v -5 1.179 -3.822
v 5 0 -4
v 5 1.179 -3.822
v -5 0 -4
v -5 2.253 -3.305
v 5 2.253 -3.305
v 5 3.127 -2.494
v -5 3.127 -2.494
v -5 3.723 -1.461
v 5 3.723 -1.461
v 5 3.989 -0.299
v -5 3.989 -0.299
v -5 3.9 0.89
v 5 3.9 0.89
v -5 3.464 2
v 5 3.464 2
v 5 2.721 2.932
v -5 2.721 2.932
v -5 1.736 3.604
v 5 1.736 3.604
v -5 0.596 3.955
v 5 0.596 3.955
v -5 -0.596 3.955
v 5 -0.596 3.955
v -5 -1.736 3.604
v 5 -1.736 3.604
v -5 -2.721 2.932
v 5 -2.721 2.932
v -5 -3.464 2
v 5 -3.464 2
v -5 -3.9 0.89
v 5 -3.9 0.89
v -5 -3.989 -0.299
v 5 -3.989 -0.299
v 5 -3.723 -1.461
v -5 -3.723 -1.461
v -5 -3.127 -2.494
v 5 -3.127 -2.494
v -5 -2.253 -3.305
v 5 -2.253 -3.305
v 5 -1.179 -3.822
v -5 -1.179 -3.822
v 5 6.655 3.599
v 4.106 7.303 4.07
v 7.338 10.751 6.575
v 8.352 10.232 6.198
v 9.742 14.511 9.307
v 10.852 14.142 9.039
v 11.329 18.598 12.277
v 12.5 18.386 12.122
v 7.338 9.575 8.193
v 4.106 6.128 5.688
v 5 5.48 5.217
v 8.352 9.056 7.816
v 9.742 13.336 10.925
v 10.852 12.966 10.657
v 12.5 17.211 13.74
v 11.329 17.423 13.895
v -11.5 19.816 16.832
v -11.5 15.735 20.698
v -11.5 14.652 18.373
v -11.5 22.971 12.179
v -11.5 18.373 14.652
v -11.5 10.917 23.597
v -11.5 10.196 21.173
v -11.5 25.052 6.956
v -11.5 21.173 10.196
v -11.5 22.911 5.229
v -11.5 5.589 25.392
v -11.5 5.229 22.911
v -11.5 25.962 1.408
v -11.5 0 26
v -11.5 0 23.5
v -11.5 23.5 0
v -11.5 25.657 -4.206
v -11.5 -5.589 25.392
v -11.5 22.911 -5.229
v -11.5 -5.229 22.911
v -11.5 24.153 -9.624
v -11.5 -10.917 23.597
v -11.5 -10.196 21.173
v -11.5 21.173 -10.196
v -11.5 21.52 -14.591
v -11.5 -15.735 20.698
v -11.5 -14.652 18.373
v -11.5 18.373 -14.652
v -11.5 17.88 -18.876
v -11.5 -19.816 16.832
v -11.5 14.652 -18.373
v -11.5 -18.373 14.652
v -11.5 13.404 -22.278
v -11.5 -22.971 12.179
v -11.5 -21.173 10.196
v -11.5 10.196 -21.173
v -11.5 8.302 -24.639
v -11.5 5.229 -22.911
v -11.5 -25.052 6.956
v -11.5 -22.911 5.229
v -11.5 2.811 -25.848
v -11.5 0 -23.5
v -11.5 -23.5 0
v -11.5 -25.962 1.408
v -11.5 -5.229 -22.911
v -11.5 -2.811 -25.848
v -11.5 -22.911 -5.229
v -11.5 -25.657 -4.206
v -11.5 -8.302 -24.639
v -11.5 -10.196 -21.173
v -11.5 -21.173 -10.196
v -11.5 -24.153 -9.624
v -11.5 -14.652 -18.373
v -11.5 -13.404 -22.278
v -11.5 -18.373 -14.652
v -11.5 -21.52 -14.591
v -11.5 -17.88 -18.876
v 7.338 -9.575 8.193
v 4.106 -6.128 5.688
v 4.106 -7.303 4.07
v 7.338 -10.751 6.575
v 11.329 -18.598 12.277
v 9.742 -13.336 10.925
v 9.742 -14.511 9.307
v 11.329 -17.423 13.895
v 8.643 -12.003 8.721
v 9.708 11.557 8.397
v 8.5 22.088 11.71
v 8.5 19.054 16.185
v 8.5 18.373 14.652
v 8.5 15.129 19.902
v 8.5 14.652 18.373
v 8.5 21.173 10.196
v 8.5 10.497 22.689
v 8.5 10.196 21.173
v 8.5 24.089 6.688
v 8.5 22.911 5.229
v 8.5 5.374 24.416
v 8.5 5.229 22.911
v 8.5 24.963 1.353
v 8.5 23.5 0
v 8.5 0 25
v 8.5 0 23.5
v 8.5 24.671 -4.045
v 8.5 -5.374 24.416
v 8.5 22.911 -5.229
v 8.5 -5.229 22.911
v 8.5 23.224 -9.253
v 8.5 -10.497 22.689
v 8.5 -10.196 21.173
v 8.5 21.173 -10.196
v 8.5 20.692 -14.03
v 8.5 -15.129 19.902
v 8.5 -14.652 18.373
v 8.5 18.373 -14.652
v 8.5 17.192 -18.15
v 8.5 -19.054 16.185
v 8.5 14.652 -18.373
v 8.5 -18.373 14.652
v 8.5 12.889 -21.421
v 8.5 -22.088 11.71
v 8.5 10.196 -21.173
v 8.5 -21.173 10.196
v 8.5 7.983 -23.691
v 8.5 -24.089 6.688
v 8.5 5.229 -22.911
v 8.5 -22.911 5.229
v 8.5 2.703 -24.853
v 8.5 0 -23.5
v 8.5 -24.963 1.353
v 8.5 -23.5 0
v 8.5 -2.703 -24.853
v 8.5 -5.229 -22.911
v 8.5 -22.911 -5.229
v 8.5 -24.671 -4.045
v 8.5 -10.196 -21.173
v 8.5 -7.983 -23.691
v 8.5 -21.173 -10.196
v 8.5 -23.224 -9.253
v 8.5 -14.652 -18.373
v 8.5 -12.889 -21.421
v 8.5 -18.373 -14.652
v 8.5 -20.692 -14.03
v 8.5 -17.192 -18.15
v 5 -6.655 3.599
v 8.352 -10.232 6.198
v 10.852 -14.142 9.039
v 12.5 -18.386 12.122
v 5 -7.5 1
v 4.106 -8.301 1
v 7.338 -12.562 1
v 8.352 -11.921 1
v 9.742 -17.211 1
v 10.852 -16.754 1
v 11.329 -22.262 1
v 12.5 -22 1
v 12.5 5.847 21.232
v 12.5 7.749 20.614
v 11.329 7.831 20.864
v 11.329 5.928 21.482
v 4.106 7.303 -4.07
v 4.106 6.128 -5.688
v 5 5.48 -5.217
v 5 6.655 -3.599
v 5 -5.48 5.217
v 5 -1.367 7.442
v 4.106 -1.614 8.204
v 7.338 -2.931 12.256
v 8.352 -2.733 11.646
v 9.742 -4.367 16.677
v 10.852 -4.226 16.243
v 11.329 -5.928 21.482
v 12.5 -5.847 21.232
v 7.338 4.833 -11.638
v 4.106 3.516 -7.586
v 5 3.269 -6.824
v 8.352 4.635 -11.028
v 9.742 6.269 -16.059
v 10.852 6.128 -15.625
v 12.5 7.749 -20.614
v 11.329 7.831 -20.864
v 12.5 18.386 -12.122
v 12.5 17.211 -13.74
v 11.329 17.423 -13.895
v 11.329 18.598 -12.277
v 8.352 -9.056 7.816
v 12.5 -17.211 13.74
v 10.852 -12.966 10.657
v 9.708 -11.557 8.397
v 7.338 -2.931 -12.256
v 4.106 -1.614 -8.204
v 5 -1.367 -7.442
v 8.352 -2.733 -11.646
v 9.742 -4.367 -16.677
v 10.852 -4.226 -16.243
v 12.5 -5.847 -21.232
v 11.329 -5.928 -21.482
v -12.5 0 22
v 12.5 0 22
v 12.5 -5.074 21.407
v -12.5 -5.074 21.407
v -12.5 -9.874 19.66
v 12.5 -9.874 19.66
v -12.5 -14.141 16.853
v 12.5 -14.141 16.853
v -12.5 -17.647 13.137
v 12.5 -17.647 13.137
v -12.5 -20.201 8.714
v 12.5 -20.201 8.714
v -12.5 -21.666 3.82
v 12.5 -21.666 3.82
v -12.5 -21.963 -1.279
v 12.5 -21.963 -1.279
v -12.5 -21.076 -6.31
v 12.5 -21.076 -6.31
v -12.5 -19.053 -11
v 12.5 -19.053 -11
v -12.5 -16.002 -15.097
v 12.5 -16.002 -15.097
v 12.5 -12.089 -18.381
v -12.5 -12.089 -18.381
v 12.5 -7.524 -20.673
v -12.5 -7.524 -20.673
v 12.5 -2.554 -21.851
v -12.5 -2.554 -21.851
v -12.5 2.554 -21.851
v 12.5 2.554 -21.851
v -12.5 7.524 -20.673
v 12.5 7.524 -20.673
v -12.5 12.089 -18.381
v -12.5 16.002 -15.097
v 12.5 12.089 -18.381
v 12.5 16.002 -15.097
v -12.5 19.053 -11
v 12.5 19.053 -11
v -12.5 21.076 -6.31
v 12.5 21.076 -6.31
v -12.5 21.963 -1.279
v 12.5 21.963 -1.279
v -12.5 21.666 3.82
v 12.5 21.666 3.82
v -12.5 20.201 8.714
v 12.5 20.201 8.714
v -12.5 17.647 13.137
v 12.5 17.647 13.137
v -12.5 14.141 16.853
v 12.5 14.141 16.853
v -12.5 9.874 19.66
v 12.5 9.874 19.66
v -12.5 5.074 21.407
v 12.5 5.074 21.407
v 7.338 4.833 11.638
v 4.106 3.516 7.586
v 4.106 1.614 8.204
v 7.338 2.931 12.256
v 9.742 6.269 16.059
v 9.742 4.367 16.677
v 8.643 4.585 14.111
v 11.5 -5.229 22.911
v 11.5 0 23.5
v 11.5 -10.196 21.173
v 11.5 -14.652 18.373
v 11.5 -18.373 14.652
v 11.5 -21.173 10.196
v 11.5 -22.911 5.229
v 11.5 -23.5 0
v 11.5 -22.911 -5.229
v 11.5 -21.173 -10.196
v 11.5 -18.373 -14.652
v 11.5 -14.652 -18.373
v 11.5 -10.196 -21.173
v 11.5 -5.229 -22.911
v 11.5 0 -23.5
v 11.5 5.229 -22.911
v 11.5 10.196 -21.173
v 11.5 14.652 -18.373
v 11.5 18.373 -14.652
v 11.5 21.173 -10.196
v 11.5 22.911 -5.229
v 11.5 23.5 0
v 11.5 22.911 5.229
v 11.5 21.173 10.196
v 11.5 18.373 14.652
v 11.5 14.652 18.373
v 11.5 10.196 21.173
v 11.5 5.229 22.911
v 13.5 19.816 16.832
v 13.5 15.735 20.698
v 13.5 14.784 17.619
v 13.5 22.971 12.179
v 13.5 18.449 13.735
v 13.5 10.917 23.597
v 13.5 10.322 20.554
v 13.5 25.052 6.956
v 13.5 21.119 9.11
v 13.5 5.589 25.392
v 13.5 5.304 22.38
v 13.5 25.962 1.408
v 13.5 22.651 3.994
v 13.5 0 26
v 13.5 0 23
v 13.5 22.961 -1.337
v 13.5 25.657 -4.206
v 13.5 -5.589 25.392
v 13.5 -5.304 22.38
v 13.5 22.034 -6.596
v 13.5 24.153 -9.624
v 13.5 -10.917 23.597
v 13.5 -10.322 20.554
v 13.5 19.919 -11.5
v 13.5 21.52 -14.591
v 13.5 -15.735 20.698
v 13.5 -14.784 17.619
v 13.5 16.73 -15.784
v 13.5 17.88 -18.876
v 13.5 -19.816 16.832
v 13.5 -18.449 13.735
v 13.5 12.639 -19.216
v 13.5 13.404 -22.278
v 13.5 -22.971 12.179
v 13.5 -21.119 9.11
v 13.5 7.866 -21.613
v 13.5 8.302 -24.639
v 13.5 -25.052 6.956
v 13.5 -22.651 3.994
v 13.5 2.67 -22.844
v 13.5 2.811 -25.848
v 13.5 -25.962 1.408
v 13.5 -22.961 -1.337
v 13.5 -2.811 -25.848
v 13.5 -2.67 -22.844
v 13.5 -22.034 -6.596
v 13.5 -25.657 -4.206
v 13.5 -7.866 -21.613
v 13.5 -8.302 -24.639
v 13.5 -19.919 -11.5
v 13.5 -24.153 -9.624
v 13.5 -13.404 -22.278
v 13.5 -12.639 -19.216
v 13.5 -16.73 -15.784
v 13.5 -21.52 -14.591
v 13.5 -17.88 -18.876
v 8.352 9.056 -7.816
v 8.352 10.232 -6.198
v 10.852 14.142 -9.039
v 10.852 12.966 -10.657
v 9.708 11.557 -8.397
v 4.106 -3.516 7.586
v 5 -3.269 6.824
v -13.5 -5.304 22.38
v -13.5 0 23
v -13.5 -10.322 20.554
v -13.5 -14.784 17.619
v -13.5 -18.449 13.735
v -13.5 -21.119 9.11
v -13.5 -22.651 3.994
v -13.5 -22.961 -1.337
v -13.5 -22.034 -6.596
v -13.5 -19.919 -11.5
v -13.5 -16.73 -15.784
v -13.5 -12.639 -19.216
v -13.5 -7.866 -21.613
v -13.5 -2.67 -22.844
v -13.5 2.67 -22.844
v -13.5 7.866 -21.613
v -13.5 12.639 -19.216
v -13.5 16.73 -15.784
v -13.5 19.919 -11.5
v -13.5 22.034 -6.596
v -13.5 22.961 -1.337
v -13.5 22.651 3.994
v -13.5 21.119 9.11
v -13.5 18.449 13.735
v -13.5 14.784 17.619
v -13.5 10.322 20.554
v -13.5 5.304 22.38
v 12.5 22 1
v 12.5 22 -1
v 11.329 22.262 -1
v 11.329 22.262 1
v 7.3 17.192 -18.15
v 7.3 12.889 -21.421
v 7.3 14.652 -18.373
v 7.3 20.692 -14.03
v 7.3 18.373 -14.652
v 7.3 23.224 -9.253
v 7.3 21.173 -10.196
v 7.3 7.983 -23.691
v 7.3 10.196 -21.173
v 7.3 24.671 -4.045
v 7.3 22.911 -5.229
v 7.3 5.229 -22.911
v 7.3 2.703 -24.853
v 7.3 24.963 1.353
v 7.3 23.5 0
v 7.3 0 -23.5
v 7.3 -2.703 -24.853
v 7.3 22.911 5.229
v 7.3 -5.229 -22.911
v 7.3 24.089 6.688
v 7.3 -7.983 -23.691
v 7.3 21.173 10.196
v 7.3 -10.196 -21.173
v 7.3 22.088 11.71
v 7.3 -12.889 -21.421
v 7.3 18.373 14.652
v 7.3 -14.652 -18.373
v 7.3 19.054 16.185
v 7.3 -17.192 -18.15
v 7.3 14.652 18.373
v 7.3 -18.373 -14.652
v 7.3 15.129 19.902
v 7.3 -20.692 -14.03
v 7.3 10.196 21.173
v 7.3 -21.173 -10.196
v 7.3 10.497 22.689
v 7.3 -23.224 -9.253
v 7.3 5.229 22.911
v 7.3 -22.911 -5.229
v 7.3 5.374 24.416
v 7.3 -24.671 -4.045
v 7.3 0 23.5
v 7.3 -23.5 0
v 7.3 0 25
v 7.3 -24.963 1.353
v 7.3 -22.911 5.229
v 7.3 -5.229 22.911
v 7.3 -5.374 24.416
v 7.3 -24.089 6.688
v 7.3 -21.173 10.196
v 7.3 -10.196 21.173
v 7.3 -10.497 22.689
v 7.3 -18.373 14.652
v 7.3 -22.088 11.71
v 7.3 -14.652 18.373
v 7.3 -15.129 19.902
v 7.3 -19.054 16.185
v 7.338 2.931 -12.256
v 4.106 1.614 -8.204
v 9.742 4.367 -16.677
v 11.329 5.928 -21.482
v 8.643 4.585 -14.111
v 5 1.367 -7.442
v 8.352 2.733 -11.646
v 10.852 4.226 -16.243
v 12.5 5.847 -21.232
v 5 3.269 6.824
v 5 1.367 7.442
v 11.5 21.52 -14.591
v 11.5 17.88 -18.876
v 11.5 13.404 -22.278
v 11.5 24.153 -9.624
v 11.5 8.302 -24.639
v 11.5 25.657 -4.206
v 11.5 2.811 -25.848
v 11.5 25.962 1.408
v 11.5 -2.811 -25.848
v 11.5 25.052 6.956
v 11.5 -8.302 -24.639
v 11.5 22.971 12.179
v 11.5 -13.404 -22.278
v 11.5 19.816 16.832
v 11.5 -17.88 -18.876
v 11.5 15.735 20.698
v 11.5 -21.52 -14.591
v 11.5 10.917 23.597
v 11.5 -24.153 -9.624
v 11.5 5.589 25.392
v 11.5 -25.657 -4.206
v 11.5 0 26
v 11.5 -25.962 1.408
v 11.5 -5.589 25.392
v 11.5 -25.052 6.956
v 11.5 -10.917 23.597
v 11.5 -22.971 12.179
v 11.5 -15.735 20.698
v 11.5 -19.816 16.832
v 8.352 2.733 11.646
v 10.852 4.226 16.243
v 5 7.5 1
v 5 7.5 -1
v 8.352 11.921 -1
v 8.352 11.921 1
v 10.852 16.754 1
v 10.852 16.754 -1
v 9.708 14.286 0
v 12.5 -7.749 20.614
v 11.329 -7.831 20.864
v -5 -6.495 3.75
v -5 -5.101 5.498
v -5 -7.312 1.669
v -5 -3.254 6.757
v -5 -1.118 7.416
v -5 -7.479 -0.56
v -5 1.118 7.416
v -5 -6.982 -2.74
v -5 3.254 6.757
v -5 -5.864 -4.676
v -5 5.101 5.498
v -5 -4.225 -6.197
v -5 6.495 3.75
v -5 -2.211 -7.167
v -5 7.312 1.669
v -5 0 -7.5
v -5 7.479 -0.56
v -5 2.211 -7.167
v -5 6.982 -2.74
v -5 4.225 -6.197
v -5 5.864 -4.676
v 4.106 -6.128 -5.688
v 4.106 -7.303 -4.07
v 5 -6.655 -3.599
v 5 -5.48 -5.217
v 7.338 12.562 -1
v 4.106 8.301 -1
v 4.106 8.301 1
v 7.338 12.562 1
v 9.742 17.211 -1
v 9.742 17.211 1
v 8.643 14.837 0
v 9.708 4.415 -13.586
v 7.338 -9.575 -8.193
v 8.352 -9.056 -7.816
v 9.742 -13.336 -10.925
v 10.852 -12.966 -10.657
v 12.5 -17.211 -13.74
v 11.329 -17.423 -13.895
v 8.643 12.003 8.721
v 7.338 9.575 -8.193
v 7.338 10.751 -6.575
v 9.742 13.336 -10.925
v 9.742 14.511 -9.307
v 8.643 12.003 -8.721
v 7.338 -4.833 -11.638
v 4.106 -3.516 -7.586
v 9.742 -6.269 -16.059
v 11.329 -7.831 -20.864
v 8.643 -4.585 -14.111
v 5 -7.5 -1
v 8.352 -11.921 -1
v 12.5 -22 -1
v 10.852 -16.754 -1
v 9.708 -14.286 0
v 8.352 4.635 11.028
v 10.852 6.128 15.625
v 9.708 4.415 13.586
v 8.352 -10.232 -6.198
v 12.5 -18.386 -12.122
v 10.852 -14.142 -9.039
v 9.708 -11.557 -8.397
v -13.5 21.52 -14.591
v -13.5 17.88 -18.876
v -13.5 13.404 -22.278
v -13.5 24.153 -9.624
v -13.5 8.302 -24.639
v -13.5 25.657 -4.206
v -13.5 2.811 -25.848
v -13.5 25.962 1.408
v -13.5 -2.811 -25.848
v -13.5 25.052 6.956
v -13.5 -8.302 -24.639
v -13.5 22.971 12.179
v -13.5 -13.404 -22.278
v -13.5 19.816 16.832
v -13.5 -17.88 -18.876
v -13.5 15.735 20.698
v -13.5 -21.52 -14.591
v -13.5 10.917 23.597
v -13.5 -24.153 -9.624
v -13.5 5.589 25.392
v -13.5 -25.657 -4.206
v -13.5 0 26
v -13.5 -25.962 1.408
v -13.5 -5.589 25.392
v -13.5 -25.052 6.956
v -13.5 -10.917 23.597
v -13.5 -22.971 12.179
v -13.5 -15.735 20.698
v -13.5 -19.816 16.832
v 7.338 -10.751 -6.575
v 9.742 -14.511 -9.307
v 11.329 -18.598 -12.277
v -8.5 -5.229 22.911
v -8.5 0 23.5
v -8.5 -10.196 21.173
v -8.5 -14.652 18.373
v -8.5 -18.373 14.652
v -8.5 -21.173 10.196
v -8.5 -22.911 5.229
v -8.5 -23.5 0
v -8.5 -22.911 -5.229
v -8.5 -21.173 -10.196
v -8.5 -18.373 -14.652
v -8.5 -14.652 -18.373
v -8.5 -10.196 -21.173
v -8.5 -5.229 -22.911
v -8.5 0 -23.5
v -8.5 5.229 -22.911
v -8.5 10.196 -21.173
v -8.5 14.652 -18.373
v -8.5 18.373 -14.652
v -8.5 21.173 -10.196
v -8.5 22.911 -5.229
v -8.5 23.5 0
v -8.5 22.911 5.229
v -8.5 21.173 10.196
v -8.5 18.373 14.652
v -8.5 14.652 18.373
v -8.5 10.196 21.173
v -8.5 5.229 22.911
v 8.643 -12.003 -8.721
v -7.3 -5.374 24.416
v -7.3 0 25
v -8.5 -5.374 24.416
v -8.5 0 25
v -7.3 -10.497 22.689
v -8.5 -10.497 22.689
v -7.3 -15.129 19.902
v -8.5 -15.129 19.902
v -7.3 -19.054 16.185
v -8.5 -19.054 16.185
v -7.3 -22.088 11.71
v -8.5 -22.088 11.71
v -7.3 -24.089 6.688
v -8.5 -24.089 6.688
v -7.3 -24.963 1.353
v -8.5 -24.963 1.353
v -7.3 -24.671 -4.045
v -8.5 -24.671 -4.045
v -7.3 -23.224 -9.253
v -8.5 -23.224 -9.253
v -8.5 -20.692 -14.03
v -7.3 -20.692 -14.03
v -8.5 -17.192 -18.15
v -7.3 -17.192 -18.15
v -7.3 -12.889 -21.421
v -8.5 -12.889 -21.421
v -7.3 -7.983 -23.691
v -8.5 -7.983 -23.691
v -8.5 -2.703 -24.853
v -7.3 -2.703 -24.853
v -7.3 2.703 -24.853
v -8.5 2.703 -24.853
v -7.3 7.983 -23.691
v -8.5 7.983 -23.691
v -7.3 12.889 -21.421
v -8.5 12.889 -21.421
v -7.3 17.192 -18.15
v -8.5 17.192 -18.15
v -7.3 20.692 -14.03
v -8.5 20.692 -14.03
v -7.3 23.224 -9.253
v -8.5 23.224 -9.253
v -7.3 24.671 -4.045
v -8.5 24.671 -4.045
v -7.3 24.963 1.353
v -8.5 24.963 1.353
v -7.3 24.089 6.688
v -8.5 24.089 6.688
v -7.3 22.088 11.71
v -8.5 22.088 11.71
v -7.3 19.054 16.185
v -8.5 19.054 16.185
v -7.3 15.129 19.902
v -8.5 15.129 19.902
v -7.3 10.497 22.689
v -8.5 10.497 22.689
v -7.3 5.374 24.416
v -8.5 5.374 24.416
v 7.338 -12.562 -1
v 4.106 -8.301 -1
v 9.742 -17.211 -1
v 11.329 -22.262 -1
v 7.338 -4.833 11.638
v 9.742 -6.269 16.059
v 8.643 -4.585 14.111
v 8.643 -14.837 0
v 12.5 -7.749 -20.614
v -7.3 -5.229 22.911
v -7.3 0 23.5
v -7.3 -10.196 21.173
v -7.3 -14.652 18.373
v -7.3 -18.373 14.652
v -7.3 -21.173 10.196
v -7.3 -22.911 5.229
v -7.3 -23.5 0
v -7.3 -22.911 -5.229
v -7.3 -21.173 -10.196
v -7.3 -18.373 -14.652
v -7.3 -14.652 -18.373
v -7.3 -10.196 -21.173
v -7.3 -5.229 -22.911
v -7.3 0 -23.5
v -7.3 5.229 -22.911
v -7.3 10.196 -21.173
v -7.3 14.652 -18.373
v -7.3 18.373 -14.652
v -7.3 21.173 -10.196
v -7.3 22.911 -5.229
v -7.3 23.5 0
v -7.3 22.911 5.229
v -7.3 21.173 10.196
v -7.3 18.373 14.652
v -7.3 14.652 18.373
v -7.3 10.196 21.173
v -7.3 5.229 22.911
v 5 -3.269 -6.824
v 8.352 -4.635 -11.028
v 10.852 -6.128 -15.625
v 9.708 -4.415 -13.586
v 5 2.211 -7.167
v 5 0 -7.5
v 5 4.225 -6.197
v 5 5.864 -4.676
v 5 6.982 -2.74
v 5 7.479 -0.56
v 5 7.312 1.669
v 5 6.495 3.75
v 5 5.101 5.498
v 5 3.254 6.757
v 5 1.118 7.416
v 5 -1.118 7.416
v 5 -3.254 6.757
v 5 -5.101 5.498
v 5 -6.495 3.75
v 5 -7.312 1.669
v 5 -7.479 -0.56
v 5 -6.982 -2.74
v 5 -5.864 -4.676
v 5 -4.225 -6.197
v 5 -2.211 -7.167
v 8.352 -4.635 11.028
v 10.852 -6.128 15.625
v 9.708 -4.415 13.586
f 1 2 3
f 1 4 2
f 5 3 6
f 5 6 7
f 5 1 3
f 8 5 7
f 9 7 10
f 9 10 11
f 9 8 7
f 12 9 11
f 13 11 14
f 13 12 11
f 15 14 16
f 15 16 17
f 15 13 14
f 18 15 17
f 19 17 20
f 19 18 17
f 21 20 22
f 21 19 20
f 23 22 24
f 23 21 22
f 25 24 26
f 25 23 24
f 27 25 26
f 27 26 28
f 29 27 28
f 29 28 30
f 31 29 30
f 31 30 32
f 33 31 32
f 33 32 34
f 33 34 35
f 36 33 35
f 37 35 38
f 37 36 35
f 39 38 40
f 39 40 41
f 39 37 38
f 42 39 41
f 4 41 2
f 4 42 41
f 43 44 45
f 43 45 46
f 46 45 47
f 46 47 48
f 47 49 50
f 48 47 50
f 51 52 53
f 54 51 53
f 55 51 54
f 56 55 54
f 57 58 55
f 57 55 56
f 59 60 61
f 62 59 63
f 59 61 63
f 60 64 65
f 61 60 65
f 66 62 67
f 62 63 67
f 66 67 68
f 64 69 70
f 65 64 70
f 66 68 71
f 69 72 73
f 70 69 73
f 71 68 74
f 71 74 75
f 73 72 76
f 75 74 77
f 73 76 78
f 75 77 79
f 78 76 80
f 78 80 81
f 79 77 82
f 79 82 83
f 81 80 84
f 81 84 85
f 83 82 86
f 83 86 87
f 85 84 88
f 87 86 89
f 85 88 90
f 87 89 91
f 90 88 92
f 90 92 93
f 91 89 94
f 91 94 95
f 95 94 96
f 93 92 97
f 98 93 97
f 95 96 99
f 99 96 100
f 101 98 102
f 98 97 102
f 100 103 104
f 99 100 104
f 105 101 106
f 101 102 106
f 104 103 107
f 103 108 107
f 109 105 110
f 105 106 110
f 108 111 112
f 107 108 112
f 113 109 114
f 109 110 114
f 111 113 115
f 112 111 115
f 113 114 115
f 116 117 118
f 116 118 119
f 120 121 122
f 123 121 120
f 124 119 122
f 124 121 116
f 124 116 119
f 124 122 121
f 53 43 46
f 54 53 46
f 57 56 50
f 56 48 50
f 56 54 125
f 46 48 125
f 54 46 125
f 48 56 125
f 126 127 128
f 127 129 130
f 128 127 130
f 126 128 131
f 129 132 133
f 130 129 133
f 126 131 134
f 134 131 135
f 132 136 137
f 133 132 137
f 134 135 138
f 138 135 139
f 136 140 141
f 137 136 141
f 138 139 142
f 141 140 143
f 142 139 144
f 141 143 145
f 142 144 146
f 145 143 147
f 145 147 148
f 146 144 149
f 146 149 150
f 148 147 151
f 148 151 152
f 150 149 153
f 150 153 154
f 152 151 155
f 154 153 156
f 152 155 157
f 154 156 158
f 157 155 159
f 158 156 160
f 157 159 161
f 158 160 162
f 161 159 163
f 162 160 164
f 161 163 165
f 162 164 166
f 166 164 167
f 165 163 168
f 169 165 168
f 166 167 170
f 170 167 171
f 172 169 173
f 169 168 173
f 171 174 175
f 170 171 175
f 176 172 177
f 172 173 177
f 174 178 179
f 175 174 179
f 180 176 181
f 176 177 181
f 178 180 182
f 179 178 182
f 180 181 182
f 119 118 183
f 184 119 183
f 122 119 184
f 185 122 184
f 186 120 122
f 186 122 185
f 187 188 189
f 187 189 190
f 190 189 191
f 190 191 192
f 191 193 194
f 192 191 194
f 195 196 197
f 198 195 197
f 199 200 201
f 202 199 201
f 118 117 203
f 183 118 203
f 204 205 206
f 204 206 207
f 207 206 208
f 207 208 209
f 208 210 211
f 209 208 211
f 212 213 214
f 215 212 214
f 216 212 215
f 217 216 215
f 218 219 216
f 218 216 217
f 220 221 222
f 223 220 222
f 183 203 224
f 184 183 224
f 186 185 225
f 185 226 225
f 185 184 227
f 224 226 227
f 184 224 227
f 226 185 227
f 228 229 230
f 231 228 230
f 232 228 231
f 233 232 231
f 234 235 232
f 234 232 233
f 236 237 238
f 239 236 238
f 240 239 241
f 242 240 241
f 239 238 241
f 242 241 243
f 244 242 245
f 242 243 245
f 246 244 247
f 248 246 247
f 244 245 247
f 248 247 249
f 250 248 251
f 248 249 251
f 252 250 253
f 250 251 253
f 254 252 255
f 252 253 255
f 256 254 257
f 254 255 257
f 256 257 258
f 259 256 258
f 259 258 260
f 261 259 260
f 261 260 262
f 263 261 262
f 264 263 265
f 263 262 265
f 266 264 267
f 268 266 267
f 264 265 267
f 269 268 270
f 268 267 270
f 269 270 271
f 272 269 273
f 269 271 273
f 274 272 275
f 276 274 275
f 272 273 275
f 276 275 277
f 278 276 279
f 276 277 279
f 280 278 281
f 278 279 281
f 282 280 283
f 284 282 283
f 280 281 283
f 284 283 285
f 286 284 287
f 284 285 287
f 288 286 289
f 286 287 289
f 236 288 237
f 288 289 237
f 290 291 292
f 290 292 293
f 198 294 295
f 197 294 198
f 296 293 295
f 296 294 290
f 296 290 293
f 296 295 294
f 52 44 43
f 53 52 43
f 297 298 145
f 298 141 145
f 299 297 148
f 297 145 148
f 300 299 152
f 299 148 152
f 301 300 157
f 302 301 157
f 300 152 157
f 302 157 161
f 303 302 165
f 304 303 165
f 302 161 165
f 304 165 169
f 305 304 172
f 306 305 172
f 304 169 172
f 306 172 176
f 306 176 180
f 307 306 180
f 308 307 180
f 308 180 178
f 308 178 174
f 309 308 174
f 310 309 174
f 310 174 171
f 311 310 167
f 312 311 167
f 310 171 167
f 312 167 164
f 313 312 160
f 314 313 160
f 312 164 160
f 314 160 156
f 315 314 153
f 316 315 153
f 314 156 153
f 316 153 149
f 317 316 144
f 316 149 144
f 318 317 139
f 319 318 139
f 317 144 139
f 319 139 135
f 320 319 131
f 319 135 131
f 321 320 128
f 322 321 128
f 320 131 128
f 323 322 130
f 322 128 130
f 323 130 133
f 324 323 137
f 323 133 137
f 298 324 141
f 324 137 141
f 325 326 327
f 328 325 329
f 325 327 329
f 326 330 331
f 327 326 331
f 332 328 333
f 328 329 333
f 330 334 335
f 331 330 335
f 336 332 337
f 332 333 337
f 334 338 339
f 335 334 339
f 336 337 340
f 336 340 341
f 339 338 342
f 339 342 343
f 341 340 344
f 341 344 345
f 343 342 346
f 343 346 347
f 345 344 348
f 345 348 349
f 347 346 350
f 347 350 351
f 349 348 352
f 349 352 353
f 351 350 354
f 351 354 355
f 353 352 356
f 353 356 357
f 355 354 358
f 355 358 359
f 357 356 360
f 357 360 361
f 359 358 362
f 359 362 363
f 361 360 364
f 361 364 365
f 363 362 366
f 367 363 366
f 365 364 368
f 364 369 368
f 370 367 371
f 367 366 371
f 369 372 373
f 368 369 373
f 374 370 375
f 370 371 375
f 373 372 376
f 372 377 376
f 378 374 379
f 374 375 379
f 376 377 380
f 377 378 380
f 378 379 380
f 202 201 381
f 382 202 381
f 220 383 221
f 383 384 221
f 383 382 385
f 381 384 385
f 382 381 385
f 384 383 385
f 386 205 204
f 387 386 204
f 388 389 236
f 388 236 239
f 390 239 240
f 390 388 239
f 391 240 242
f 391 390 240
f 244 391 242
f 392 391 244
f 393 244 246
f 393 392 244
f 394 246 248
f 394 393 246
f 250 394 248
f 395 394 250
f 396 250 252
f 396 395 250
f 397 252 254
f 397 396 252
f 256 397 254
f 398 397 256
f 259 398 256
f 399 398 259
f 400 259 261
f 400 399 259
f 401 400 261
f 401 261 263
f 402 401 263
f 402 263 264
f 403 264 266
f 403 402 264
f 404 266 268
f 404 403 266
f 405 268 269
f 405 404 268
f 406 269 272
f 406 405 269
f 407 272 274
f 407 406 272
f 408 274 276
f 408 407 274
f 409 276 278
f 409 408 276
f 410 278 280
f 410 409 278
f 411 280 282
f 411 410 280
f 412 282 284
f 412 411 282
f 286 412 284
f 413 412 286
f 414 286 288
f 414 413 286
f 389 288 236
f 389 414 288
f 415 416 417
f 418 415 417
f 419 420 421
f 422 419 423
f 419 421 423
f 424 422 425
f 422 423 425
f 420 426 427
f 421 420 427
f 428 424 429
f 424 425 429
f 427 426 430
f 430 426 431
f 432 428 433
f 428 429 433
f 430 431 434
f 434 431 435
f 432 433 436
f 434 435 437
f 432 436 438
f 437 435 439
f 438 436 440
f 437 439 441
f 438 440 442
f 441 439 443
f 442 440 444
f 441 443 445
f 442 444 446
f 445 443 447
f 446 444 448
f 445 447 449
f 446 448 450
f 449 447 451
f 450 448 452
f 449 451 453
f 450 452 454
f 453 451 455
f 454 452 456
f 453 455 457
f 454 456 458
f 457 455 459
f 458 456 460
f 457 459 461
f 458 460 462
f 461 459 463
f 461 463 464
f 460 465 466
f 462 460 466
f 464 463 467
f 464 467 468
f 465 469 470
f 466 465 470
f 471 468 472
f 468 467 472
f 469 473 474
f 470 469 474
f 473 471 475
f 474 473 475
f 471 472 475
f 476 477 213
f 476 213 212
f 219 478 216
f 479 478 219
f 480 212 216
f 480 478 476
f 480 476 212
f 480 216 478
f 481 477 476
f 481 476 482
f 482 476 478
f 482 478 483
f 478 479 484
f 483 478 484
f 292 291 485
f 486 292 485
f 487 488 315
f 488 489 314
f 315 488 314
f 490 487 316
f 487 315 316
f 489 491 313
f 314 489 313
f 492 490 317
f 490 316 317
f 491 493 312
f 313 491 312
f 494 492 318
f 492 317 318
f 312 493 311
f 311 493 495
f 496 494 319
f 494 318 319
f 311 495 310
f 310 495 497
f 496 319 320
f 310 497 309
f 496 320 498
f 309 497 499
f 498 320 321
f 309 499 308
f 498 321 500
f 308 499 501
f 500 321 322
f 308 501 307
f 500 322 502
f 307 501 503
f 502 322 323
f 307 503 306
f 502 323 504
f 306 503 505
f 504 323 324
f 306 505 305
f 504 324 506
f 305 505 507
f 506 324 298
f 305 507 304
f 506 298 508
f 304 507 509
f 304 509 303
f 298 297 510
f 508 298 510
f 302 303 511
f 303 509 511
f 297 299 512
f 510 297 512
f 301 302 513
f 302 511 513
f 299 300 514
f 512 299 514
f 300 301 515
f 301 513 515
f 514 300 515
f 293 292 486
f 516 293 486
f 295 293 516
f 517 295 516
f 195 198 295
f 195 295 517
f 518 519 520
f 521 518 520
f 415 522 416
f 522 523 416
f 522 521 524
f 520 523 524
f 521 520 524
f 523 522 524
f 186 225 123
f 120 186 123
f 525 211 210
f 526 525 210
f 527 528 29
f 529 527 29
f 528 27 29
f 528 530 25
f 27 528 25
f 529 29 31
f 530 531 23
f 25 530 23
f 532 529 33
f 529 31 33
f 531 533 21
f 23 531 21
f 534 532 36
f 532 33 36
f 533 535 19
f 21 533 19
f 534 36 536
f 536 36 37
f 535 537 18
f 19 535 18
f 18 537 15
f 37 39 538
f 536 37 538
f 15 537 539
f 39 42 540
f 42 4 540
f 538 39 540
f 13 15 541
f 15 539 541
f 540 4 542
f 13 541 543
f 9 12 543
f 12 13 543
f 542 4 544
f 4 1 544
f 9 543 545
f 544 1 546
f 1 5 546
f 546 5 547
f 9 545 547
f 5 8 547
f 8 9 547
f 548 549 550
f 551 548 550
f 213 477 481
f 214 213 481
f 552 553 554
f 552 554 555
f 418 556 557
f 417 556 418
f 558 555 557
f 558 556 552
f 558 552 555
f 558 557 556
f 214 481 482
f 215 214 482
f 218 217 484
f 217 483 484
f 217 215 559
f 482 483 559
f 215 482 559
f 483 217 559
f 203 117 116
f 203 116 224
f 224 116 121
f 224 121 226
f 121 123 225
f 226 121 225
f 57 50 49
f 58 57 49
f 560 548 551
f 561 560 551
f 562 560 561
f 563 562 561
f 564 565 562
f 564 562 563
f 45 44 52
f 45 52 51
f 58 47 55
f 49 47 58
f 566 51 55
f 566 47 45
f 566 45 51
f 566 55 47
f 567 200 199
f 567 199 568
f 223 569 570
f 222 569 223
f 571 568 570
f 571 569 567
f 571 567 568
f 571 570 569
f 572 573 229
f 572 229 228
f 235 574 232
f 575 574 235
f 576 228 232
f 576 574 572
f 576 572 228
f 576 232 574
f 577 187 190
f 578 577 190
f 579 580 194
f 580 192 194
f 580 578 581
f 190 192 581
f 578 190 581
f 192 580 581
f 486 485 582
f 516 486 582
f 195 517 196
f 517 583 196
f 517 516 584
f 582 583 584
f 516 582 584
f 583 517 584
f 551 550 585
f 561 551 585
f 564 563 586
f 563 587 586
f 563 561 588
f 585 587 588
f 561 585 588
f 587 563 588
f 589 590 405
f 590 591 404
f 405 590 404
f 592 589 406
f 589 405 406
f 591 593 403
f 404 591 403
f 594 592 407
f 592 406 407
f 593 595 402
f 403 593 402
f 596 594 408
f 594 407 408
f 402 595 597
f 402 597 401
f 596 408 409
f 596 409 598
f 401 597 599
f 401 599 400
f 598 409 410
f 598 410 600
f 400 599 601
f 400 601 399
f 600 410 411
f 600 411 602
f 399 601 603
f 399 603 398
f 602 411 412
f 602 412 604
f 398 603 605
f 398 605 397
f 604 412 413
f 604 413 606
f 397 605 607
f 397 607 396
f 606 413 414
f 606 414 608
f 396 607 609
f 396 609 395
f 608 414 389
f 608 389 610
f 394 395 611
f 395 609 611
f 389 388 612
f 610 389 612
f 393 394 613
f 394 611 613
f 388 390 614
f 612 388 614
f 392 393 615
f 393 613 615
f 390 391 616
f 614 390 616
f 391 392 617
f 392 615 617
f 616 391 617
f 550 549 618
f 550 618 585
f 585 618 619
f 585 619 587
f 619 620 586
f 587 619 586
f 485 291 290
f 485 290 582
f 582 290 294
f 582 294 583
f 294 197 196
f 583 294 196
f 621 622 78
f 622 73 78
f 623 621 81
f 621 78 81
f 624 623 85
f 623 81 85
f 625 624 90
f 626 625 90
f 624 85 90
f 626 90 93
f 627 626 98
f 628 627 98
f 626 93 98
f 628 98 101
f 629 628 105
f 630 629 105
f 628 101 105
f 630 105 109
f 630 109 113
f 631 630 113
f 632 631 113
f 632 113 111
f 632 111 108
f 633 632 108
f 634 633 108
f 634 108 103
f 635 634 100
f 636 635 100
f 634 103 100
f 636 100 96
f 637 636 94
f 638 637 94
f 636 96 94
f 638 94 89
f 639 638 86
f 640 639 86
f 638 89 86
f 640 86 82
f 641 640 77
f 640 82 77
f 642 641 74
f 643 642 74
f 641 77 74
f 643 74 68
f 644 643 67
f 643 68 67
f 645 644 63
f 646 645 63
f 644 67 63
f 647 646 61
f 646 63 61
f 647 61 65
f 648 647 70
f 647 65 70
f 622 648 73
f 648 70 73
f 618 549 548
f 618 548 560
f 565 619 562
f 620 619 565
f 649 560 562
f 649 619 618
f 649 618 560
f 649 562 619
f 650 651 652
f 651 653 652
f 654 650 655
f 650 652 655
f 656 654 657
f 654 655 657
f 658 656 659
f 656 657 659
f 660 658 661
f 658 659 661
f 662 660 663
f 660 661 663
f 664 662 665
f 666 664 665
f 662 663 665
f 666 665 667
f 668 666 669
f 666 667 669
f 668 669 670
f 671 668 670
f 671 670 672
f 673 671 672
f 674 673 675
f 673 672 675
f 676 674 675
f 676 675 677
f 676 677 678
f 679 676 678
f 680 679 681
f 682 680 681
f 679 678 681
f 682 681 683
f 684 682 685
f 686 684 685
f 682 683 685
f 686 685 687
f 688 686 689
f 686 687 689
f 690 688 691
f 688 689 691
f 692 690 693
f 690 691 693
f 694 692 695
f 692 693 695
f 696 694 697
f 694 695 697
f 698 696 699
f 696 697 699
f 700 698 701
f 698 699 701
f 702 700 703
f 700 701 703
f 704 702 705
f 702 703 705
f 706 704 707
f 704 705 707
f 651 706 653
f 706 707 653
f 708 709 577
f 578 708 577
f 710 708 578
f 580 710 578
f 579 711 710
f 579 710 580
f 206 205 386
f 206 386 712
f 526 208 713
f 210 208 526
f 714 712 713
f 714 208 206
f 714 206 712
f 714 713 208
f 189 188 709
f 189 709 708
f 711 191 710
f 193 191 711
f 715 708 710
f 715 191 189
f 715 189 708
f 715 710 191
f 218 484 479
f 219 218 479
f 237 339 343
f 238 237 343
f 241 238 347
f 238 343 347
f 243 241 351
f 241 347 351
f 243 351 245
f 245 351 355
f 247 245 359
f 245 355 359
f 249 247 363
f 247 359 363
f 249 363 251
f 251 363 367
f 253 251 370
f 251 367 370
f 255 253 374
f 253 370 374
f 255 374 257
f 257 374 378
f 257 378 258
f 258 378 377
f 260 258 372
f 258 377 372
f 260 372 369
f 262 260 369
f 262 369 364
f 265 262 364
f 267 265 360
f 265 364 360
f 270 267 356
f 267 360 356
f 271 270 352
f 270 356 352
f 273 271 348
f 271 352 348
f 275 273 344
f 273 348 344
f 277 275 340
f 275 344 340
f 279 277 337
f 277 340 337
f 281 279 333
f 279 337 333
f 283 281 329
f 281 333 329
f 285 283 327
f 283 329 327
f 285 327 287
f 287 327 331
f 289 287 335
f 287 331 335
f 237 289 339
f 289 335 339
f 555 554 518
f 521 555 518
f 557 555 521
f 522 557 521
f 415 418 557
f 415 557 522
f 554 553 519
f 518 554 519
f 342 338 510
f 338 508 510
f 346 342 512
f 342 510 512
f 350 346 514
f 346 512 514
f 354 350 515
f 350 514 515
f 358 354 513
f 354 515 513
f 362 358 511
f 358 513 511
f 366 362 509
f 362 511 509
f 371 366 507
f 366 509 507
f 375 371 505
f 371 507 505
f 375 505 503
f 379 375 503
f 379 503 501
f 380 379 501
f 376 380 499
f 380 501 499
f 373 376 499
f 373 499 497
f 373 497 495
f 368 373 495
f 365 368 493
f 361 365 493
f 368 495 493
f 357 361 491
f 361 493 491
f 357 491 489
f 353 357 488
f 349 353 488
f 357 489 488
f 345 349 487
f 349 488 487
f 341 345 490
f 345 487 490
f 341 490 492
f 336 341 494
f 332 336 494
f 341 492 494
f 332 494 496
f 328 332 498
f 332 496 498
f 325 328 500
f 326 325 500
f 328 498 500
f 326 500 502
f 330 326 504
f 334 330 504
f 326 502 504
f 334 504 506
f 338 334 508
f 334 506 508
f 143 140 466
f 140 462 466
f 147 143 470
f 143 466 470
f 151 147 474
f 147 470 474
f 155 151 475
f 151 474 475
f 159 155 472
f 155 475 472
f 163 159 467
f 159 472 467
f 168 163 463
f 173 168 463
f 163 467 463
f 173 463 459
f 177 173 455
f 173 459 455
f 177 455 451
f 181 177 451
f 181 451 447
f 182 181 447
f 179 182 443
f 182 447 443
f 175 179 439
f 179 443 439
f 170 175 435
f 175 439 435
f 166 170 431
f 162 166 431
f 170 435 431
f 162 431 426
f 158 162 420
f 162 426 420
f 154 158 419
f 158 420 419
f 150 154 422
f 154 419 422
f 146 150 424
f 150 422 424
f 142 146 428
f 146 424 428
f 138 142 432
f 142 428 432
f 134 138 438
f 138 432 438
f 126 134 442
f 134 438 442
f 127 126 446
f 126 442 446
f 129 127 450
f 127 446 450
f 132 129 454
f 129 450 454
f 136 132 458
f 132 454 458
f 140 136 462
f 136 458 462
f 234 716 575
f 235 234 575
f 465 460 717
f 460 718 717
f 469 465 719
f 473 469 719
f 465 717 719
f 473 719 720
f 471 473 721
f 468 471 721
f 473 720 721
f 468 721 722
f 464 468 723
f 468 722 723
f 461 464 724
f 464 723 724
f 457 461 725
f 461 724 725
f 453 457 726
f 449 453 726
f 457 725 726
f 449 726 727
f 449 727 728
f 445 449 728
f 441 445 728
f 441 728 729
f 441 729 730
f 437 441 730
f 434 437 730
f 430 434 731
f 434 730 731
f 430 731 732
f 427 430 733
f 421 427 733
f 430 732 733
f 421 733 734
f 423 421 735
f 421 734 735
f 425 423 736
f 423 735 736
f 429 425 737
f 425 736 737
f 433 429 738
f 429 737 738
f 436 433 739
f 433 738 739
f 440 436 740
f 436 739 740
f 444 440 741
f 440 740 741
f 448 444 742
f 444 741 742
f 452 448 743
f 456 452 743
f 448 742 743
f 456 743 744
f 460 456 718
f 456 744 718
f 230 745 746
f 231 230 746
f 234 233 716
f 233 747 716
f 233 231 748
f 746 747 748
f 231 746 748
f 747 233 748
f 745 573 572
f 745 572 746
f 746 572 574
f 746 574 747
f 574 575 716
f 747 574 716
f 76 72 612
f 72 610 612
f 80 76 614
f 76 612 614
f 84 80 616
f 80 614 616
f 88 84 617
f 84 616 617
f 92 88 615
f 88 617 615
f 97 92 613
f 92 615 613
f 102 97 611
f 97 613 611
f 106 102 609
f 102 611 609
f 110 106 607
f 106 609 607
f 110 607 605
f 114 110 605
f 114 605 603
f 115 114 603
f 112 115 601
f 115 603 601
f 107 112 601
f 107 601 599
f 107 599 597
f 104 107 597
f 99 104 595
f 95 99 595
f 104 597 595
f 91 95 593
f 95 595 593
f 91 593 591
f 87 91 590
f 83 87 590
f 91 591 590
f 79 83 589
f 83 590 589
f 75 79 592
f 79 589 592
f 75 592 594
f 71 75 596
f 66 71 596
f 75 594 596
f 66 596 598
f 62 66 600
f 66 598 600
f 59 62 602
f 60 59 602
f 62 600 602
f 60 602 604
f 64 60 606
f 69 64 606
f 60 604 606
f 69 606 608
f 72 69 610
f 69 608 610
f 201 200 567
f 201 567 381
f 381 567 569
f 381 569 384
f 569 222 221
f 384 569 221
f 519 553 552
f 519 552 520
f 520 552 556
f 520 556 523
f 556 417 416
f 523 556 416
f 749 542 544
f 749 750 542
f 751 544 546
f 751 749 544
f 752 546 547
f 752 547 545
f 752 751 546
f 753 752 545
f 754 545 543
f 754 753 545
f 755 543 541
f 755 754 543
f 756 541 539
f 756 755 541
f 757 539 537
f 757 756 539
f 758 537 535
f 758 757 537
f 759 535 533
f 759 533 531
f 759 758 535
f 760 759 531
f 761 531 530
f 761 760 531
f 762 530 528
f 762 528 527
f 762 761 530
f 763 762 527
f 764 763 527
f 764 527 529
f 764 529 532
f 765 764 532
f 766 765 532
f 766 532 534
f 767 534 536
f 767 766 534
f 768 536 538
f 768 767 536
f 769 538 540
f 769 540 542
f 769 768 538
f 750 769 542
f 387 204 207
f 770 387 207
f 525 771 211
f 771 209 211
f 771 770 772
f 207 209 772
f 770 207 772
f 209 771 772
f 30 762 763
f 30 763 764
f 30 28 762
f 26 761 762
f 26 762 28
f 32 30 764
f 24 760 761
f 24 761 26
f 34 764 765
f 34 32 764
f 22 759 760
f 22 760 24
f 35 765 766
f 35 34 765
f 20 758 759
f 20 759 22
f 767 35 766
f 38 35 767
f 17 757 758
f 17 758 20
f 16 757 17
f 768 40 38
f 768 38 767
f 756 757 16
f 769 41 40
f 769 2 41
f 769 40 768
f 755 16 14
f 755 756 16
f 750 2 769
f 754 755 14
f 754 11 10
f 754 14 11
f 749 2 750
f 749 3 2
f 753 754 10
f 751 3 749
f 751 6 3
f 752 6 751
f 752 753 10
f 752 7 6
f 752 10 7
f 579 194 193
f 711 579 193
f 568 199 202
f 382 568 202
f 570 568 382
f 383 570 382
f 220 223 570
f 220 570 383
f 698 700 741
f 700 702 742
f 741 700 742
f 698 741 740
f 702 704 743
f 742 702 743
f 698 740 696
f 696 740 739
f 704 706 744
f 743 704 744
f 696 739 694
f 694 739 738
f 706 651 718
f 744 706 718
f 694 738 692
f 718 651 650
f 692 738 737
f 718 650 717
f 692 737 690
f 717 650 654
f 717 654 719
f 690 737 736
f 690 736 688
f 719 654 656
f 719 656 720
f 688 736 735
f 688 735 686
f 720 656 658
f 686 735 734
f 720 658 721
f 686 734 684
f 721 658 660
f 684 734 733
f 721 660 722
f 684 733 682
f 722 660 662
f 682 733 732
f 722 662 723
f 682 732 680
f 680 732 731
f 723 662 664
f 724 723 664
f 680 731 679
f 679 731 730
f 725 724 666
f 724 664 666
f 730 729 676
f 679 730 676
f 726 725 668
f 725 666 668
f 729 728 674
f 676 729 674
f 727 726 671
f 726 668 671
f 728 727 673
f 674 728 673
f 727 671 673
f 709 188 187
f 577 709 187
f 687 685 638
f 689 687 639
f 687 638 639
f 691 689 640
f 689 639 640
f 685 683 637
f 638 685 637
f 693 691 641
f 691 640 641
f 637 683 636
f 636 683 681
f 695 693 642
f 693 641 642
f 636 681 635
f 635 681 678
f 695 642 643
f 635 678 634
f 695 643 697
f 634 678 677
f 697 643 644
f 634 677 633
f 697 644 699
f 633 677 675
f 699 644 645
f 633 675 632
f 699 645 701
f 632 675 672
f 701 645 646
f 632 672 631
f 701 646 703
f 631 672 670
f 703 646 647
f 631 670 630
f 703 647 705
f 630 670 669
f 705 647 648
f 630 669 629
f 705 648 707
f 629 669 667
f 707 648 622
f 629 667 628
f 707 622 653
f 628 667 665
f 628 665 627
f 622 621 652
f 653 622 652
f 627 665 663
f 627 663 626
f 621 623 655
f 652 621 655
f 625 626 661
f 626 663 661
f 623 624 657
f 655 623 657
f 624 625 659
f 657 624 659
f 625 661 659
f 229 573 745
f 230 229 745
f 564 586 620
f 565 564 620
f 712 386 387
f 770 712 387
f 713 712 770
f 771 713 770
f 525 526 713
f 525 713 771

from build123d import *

# Parameters (mm, degrees)
CHAMFER1_SIZE       = 1
SKETCH2_R           = 7.5
SKETCH2_R_2         = 4
BOSS_EXTRUDE1_DEPTH = 5
EXTRUDE_THIN2_START = -1
EXTRUDE_THIN2_DEPTH = 2
CIRPATTERN1_COUNT   = 10


# Read off the part's stored shape, not the designer's step: Extrude-Thin2
with BuildPart() as part:
    # Sketch1 → Revolve1 (revolve)
    with BuildSketch(Plane.XY, mode=Mode.PRIVATE) as revolve1_sk:
        Polygon((-13.5, 22), (13.5, 22), (13.5, 26), (11.5, 26), (11.5, 23.5), (8.5, 23.5), (8.5, 25), (7.3, 25), (7.3, 23.5), (-7.3, 23.5), (-7.3, 25), (-8.5, 25), (-8.5, 23.5), (-11.5, 23.5), (-11.5, 26), (-13.5, 26), align=None)
    revolve(revolve1_sk.sketch.rotate(Axis((-13.5, 0, 0), (1, 0, 0)), 90), axis=Axis((-13.5, 0, 0), (1, 0, 0)))

    # Chamfer1
    chamfer1_edges = [part.edges().sort_by_distance(p)[0] for p in [
        (-13.5, 0, -22),
        (13.5, 0, -22),
    ]]
    chamfer(chamfer1_edges, length=CHAMFER1_SIZE)


with BuildPart() as body_2:
    # Sketch2 → Boss-Extrude1 (new, symmetric)
    with BuildSketch(Plane(origin=(0, 0, 0), x_dir=(0, 0, -1), z_dir=(1, 0, 0))):
        Circle(SKETCH2_R)
        Circle(SKETCH2_R_2, mode=Mode.SUBTRACT)
    extrude(amount=BOSS_EXTRUDE1_DEPTH, both=True)


with BuildPart() as body_3:
    # Extrude-Thin2 outline → Extrude-Thin2 (new body)
    with BuildSketch(Plane.XY.offset(EXTRUDE_THIN2_START)):
        with BuildLine():
            Line((4.106479489, 8.301012544), (5, 7.5))
            add(Edge.make_bspline(
                [(5, 7.5), (10.666887119, 13.821349036), (12.5, 22)],
                knots=[0, 0, 0, 1, 1, 1], degree=2))
            Line((12.5, 22), (11.329051499, 22.262449246))
            add(Edge.make_bspline(
                [(4.106479489, 8.301012544), (5.931055828, 10.336306991), (7.44052062, 12.512995937), (9.844644155, 17.160968105), (10.739657019, 19.632795732), (11.329051499, 22.262449246)],
                knots=[0, 0, 0, 0, 0.5, 0.5, 1, 1, 1, 1], degree=3))
        make_face()
    extrude(amount=EXTRUDE_THIN2_DEPTH)


with BuildPart() as cirpattern1_1:
    # CirPattern1: pattern copy
    add(body_3.part.rotate(Axis((5, 0, 0), (1, 0, 0)), 1 * 360 / CIRPATTERN1_COUNT))


with BuildPart() as cirpattern1_2:
    # CirPattern1: pattern copy
    add(body_3.part.rotate(Axis((5, 0, 0), (1, 0, 0)), 2 * 360 / CIRPATTERN1_COUNT))


with BuildPart() as cirpattern1_3:
    # CirPattern1: pattern copy
    add(body_3.part.rotate(Axis((5, 0, 0), (1, 0, 0)), 3 * 360 / CIRPATTERN1_COUNT))


with BuildPart() as cirpattern1_4:
    # CirPattern1: pattern copy
    add(body_3.part.rotate(Axis((5, 0, 0), (1, 0, 0)), 4 * 360 / CIRPATTERN1_COUNT))


with BuildPart() as cirpattern1_5:
    # CirPattern1: pattern copy
    add(body_3.part.rotate(Axis((5, 0, 0), (1, 0, 0)), 5 * 360 / CIRPATTERN1_COUNT))


with BuildPart() as cirpattern1_6:
    # CirPattern1: pattern copy
    add(body_3.part.rotate(Axis((5, 0, 0), (1, 0, 0)), 6 * 360 / CIRPATTERN1_COUNT))


with BuildPart() as cirpattern1_7:
    # CirPattern1: pattern copy
    add(body_3.part.rotate(Axis((5, 0, 0), (1, 0, 0)), 7 * 360 / CIRPATTERN1_COUNT))


with BuildPart() as cirpattern1_8:
    # CirPattern1: pattern copy
    add(body_3.part.rotate(Axis((5, 0, 0), (1, 0, 0)), 8 * 360 / CIRPATTERN1_COUNT))


with BuildPart() as cirpattern1_9:
    # CirPattern1: pattern copy
    add(body_3.part.rotate(Axis((5, 0, 0), (1, 0, 0)), 9 * 360 / CIRPATTERN1_COUNT))


solid = Compound([part.part, body_2.part, body_3.part, cirpattern1_1.part, cirpattern1_2.part, cirpattern1_3.part, cirpattern1_4.part, cirpattern1_5.part, cirpattern1_6.part, cirpattern1_7.part, cirpattern1_8.part, cirpattern1_9.part])
